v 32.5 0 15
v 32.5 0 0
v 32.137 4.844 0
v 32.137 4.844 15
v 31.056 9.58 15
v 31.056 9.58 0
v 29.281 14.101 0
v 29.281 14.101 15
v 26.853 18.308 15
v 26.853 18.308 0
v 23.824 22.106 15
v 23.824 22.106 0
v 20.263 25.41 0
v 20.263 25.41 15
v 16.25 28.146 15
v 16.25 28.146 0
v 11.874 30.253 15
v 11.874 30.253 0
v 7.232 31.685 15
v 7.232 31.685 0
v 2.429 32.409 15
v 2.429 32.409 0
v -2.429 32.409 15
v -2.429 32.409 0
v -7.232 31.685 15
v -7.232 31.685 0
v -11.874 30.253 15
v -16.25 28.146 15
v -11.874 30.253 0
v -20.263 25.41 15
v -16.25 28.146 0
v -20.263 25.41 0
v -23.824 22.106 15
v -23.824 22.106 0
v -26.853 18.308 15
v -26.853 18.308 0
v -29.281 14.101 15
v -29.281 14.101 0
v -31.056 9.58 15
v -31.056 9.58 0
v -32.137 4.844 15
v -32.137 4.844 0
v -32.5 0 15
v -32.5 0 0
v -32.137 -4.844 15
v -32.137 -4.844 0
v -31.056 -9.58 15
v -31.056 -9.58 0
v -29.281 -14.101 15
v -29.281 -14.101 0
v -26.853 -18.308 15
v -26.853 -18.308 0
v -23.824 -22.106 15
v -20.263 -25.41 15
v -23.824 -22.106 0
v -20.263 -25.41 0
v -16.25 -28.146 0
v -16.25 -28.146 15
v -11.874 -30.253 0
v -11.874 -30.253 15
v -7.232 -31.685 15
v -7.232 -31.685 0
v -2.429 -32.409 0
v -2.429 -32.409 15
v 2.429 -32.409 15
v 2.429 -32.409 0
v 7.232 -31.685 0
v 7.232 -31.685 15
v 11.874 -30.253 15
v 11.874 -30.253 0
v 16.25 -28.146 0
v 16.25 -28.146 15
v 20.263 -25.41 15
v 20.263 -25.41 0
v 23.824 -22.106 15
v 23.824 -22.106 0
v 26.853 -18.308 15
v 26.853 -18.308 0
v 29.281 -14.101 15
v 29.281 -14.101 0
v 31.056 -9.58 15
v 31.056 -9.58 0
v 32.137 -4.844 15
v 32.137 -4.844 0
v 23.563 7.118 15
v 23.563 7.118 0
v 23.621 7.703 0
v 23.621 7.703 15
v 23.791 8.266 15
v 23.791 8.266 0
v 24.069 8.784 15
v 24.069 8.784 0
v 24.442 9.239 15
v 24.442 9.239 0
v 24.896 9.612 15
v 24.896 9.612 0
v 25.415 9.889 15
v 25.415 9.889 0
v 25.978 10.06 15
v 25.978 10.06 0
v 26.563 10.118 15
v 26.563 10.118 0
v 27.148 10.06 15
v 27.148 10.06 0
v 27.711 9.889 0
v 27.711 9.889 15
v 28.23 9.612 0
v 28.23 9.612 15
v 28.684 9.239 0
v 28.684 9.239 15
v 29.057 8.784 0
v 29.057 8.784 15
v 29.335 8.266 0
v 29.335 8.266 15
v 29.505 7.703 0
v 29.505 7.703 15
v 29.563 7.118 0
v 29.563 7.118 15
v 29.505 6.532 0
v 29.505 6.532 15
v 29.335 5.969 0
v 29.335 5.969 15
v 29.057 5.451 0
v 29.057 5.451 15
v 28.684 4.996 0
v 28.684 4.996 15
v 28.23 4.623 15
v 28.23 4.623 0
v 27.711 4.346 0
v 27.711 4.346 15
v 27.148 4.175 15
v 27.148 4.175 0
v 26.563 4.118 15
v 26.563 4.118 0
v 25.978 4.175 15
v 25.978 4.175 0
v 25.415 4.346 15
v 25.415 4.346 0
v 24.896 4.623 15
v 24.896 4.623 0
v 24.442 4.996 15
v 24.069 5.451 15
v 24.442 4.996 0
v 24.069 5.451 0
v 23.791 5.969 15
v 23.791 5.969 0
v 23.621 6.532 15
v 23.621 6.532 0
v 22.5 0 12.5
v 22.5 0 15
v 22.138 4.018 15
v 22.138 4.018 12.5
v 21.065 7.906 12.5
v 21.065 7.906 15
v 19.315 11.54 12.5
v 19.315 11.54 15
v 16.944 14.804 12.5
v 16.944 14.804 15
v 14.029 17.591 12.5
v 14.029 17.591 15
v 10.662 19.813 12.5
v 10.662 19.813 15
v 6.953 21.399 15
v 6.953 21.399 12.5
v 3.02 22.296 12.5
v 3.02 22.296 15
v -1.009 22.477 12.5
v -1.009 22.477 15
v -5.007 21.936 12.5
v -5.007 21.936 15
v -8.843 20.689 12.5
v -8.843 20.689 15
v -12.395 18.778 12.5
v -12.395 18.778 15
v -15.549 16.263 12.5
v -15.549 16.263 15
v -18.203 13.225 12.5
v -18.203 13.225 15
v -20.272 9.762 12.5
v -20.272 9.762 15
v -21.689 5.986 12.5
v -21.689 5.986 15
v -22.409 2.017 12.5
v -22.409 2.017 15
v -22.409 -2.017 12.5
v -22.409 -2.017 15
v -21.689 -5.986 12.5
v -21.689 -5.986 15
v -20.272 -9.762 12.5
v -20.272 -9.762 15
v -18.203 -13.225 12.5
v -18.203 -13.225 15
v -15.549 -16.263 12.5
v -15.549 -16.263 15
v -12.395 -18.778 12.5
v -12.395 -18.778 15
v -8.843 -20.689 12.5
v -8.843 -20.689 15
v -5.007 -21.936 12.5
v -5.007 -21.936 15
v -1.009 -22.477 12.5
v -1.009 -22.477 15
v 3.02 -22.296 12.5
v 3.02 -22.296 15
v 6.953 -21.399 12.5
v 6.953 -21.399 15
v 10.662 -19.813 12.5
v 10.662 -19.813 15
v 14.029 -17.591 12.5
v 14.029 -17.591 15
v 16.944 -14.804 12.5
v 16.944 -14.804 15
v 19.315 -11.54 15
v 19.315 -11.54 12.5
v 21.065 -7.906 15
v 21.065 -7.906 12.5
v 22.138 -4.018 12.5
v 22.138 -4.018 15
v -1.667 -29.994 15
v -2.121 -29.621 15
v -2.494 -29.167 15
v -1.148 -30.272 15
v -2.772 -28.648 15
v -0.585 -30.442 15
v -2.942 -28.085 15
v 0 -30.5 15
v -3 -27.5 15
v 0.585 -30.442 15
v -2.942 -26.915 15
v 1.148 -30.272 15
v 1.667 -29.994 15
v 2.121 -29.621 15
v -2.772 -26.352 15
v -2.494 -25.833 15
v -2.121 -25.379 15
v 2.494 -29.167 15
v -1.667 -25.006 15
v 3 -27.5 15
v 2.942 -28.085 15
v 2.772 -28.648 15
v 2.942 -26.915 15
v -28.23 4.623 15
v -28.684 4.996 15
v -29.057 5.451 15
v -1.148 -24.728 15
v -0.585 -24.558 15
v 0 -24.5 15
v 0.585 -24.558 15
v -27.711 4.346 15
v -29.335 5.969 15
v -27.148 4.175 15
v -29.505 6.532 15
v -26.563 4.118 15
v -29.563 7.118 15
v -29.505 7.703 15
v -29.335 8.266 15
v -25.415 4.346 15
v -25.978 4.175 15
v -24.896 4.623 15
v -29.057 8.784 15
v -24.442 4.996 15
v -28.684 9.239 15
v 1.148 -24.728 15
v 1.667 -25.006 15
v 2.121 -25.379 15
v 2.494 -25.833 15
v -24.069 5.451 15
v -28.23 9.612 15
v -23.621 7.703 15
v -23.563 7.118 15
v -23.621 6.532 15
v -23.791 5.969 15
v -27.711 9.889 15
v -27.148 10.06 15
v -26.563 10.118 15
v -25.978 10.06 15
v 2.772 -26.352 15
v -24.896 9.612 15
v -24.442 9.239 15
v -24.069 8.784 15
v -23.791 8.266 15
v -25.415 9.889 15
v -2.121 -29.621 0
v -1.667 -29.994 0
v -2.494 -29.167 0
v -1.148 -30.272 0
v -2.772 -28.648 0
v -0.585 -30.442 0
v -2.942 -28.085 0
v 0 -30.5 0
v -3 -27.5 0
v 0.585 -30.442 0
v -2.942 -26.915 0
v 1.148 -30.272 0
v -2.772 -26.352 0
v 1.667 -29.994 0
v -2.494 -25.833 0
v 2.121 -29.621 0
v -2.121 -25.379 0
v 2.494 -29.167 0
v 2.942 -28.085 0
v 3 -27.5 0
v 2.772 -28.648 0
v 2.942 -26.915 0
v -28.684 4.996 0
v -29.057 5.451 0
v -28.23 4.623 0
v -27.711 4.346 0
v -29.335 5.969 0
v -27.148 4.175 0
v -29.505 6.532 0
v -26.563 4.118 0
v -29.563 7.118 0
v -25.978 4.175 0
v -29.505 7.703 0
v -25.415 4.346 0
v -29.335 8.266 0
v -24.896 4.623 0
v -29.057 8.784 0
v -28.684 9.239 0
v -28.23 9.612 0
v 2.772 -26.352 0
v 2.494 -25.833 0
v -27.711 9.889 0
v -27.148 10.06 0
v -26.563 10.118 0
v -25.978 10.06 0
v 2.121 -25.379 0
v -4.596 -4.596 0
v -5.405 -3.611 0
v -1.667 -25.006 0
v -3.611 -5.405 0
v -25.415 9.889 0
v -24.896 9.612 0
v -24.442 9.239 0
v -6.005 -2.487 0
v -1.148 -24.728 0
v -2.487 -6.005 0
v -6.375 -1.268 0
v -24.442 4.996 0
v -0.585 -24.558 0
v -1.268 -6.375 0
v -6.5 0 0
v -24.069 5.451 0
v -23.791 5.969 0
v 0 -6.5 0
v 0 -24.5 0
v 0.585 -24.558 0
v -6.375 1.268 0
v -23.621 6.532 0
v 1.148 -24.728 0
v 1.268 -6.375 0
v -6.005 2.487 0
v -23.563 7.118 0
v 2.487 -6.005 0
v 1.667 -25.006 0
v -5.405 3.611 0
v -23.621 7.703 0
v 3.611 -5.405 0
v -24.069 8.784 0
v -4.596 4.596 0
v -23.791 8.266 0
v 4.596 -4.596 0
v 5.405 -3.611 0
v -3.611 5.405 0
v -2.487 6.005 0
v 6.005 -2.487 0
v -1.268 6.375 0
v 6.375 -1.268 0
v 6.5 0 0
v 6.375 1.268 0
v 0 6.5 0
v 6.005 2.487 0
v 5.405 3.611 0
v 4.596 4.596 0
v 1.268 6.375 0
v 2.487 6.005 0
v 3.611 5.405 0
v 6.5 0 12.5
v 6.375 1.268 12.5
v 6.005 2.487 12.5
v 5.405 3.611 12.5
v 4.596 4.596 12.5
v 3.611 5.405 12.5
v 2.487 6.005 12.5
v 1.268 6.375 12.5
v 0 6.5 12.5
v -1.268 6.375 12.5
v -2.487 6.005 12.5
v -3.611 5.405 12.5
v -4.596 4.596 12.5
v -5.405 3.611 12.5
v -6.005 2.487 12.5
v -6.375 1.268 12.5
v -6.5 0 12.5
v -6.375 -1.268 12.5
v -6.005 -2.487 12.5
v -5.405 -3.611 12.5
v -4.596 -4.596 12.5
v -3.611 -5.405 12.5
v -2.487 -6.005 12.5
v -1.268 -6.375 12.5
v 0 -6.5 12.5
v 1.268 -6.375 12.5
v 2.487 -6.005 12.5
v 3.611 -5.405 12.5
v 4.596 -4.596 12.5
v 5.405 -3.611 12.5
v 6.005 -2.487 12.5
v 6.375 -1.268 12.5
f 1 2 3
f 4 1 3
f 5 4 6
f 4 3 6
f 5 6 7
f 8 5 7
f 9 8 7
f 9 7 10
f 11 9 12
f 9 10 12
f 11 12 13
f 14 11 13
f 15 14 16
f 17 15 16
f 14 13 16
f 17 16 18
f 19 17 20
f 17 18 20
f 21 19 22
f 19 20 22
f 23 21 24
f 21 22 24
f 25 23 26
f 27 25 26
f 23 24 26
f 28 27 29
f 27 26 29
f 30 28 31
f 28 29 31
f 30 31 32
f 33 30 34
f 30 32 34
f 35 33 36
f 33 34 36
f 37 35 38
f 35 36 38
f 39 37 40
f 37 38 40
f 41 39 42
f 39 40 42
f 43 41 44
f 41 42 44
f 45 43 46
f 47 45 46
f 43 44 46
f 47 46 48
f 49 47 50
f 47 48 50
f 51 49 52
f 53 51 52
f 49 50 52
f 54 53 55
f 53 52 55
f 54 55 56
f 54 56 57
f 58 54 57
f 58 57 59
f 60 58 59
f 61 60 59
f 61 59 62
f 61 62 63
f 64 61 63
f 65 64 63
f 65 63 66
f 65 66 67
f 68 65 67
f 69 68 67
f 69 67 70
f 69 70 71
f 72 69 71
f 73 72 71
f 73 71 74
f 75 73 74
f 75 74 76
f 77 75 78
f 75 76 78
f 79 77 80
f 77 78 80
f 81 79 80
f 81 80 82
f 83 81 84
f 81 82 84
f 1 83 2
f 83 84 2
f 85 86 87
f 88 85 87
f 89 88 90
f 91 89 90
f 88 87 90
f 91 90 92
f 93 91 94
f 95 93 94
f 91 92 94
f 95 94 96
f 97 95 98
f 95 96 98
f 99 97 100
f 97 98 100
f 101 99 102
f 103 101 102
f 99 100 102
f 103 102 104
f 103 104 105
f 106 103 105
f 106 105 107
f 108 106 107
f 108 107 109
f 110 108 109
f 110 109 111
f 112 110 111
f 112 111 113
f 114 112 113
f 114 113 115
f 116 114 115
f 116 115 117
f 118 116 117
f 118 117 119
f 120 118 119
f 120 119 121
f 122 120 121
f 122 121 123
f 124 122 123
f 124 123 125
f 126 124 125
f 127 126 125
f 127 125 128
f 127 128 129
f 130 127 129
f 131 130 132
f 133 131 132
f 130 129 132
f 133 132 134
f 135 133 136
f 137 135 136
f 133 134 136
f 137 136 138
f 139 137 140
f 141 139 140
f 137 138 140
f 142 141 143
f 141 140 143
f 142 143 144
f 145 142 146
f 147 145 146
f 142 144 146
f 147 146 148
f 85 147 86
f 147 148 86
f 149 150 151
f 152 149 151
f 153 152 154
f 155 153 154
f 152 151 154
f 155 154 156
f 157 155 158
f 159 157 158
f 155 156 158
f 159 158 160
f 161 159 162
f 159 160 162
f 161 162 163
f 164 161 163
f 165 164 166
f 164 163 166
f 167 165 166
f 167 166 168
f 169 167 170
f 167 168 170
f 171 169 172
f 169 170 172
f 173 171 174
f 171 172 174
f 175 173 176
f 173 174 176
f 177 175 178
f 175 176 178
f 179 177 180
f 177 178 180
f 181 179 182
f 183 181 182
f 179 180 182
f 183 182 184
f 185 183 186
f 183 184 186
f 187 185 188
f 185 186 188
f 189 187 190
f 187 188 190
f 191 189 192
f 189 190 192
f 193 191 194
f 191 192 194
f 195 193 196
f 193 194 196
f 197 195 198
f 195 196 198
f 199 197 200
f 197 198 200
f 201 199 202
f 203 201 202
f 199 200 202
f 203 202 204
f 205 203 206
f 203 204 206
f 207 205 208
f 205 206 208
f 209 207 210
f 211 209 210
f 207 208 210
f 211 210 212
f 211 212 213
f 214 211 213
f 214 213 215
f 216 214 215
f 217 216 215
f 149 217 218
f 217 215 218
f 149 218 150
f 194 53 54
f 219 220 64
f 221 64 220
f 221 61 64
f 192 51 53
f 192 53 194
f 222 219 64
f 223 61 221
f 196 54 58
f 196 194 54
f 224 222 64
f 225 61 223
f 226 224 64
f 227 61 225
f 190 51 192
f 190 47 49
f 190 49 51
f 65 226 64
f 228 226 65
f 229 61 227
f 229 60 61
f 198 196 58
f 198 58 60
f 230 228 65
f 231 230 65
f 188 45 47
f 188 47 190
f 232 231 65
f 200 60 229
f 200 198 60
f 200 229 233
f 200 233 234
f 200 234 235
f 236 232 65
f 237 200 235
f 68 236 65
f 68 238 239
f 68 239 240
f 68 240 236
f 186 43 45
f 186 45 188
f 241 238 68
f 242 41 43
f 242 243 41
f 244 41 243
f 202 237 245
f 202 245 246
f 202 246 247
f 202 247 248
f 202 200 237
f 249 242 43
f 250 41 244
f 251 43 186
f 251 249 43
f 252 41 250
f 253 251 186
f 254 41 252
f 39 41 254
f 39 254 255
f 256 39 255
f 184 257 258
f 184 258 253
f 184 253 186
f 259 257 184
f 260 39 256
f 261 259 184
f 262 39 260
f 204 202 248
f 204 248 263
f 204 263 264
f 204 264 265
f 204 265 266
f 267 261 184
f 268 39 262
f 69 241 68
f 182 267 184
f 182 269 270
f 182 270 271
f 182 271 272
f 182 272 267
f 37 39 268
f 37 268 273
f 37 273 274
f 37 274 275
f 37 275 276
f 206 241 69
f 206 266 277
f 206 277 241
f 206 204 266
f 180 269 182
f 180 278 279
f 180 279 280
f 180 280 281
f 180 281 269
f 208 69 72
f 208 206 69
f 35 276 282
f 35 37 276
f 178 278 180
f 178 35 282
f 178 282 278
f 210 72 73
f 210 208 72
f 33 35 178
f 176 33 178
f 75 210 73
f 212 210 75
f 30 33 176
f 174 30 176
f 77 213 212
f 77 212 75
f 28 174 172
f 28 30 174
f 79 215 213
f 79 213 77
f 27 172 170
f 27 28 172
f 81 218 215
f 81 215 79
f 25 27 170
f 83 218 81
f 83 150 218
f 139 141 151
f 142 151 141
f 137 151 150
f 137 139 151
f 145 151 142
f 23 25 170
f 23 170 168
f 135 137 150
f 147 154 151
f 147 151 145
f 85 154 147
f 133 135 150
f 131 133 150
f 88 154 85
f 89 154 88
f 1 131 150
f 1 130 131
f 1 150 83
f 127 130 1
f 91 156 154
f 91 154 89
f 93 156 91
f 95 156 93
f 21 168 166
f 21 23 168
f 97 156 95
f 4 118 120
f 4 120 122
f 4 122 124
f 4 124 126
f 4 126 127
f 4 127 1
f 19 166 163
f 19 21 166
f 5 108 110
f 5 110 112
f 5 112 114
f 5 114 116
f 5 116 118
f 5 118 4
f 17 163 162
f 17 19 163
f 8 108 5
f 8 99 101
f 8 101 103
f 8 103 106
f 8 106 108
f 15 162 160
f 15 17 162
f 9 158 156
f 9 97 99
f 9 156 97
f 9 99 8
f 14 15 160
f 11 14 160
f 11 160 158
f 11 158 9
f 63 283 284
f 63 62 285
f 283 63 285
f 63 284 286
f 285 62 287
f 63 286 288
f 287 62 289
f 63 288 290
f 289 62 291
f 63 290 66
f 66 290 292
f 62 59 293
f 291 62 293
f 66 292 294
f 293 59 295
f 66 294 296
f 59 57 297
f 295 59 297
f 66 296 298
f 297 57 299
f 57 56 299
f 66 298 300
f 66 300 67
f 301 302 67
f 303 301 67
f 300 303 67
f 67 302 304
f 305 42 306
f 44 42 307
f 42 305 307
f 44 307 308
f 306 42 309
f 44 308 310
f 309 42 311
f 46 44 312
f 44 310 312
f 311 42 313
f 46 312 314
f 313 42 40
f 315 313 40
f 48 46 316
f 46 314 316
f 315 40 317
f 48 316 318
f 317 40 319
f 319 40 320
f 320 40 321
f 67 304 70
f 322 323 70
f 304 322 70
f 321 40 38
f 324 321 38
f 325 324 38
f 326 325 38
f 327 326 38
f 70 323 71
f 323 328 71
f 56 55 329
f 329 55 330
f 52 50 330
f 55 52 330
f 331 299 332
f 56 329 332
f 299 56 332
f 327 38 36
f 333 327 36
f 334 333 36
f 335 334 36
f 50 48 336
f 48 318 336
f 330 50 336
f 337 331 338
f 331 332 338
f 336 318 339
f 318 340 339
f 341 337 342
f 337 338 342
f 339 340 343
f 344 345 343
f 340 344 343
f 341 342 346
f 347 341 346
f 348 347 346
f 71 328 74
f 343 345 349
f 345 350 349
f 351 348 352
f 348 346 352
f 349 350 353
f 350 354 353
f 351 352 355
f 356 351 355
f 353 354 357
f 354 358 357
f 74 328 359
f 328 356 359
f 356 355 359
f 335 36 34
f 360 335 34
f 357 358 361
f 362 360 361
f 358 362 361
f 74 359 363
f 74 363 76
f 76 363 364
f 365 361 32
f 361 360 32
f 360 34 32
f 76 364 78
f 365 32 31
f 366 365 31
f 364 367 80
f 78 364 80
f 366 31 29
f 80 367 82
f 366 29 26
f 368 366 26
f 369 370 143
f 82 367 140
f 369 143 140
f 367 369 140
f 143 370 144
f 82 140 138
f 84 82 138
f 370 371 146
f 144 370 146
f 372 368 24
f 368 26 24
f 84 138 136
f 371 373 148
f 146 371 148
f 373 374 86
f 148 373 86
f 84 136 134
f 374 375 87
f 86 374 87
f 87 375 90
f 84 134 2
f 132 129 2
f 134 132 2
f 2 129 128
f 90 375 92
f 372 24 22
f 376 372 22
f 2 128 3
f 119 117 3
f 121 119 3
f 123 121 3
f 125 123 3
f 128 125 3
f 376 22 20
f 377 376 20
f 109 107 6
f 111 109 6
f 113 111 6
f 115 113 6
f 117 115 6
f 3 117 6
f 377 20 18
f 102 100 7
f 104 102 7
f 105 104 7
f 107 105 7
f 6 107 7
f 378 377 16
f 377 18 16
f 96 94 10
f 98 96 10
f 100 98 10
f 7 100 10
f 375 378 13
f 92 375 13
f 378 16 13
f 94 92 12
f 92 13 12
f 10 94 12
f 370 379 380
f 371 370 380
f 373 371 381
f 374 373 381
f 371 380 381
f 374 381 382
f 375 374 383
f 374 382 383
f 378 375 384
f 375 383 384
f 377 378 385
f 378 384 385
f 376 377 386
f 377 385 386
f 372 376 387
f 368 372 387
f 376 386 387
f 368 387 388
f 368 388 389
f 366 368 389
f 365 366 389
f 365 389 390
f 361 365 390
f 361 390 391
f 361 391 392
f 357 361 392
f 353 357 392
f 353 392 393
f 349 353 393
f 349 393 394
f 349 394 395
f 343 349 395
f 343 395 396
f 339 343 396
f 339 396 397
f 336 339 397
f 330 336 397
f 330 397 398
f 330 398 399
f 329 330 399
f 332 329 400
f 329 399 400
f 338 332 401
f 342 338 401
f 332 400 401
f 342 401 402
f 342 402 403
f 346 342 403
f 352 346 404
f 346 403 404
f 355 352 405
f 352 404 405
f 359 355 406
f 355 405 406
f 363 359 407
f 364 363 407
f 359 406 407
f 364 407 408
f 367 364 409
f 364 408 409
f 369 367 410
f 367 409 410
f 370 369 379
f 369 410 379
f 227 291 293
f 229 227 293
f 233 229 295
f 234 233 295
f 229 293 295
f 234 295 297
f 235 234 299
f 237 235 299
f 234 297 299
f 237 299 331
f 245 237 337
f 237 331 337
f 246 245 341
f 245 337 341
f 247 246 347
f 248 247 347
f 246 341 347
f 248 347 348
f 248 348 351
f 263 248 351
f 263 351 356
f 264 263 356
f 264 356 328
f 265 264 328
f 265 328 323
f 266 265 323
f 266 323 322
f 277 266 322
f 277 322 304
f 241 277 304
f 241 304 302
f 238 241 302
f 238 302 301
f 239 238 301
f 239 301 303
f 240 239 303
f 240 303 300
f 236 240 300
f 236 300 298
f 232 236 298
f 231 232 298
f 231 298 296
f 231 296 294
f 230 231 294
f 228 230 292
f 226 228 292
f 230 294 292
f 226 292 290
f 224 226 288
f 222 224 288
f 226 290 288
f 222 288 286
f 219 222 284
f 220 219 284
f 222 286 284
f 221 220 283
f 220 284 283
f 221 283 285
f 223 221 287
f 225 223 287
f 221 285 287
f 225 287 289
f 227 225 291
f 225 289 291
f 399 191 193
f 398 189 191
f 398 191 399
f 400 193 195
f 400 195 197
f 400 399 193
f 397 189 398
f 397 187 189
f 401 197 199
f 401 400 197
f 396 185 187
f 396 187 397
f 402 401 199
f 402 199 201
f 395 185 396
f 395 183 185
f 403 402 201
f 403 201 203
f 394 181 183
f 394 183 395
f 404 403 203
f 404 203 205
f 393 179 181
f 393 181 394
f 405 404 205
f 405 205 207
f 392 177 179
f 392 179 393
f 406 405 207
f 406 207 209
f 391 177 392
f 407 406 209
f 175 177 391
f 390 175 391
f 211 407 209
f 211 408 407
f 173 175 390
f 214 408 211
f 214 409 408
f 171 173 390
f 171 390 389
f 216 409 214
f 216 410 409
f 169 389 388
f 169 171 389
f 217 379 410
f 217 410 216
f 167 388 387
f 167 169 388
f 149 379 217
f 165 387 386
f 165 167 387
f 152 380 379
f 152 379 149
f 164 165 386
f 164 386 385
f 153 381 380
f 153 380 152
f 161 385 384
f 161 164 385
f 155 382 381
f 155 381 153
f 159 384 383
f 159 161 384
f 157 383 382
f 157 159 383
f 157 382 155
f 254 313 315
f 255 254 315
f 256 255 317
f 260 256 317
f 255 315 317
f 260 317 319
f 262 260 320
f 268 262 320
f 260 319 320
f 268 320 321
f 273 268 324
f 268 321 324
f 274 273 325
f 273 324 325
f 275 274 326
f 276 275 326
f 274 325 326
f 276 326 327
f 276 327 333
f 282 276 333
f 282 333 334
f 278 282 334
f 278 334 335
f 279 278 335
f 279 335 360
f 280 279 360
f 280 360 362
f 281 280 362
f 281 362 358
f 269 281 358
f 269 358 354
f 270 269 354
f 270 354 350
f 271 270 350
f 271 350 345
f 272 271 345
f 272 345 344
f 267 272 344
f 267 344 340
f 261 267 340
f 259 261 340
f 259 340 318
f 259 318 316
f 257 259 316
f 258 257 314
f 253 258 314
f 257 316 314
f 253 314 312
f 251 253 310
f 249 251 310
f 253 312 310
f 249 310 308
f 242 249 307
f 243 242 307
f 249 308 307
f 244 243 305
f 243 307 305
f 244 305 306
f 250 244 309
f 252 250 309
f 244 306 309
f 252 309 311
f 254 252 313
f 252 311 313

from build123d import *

# Parameters (mm, degrees)
ESQUISSE1_R                = 32.5
BOSS_EXTRU_1_DEPTH         = 15
ESQUISSE2_R                = 22.5
ENL_V_MAT_EXTRU_1_DEPTH    = 2.5
ESQUISSE3_R                = 6.5
ENL_V_MAT_EXTRU_2_DEPTH    = 48.631397208
TROUS_DE_CENTRAGE_6_0MM1_D = 6


with BuildPart() as part:
    # Esquisse1 → Boss.-Extru.1 (new body)
    with BuildSketch(Plane.XY):
        Circle(ESQUISSE1_R)
    extrude(amount=BOSS_EXTRU_1_DEPTH)

    # Esquisse2 → Enlèv. mat.-Extru.1 (cut)
    with BuildSketch(Plane.XY.offset(15)):
        Circle(ESQUISSE2_R)
    extrude(amount=-ENL_V_MAT_EXTRU_1_DEPTH, mode=Mode.SUBTRACT)

    # Esquisse3 → Enlèv. mat.-Extru.2 (cut, through all)
    with BuildSketch(Plane.XY.offset(12.5)):
        Circle(ESQUISSE3_R)
    extrude(amount=-ENL_V_MAT_EXTRU_2_DEPTH, mode=Mode.SUBTRACT)

    # Trous de centrage Ø6.0mm1 (through all)
    with Locations(Plane.XY.offset(15)):
        with Locations((0, -27.5), (-26.562960223, 7.11752374), (26.562960223, 7.11752374)):
            Hole(TROUS_DE_CENTRAGE_6_0MM1_D / 2)


solid = part.part
